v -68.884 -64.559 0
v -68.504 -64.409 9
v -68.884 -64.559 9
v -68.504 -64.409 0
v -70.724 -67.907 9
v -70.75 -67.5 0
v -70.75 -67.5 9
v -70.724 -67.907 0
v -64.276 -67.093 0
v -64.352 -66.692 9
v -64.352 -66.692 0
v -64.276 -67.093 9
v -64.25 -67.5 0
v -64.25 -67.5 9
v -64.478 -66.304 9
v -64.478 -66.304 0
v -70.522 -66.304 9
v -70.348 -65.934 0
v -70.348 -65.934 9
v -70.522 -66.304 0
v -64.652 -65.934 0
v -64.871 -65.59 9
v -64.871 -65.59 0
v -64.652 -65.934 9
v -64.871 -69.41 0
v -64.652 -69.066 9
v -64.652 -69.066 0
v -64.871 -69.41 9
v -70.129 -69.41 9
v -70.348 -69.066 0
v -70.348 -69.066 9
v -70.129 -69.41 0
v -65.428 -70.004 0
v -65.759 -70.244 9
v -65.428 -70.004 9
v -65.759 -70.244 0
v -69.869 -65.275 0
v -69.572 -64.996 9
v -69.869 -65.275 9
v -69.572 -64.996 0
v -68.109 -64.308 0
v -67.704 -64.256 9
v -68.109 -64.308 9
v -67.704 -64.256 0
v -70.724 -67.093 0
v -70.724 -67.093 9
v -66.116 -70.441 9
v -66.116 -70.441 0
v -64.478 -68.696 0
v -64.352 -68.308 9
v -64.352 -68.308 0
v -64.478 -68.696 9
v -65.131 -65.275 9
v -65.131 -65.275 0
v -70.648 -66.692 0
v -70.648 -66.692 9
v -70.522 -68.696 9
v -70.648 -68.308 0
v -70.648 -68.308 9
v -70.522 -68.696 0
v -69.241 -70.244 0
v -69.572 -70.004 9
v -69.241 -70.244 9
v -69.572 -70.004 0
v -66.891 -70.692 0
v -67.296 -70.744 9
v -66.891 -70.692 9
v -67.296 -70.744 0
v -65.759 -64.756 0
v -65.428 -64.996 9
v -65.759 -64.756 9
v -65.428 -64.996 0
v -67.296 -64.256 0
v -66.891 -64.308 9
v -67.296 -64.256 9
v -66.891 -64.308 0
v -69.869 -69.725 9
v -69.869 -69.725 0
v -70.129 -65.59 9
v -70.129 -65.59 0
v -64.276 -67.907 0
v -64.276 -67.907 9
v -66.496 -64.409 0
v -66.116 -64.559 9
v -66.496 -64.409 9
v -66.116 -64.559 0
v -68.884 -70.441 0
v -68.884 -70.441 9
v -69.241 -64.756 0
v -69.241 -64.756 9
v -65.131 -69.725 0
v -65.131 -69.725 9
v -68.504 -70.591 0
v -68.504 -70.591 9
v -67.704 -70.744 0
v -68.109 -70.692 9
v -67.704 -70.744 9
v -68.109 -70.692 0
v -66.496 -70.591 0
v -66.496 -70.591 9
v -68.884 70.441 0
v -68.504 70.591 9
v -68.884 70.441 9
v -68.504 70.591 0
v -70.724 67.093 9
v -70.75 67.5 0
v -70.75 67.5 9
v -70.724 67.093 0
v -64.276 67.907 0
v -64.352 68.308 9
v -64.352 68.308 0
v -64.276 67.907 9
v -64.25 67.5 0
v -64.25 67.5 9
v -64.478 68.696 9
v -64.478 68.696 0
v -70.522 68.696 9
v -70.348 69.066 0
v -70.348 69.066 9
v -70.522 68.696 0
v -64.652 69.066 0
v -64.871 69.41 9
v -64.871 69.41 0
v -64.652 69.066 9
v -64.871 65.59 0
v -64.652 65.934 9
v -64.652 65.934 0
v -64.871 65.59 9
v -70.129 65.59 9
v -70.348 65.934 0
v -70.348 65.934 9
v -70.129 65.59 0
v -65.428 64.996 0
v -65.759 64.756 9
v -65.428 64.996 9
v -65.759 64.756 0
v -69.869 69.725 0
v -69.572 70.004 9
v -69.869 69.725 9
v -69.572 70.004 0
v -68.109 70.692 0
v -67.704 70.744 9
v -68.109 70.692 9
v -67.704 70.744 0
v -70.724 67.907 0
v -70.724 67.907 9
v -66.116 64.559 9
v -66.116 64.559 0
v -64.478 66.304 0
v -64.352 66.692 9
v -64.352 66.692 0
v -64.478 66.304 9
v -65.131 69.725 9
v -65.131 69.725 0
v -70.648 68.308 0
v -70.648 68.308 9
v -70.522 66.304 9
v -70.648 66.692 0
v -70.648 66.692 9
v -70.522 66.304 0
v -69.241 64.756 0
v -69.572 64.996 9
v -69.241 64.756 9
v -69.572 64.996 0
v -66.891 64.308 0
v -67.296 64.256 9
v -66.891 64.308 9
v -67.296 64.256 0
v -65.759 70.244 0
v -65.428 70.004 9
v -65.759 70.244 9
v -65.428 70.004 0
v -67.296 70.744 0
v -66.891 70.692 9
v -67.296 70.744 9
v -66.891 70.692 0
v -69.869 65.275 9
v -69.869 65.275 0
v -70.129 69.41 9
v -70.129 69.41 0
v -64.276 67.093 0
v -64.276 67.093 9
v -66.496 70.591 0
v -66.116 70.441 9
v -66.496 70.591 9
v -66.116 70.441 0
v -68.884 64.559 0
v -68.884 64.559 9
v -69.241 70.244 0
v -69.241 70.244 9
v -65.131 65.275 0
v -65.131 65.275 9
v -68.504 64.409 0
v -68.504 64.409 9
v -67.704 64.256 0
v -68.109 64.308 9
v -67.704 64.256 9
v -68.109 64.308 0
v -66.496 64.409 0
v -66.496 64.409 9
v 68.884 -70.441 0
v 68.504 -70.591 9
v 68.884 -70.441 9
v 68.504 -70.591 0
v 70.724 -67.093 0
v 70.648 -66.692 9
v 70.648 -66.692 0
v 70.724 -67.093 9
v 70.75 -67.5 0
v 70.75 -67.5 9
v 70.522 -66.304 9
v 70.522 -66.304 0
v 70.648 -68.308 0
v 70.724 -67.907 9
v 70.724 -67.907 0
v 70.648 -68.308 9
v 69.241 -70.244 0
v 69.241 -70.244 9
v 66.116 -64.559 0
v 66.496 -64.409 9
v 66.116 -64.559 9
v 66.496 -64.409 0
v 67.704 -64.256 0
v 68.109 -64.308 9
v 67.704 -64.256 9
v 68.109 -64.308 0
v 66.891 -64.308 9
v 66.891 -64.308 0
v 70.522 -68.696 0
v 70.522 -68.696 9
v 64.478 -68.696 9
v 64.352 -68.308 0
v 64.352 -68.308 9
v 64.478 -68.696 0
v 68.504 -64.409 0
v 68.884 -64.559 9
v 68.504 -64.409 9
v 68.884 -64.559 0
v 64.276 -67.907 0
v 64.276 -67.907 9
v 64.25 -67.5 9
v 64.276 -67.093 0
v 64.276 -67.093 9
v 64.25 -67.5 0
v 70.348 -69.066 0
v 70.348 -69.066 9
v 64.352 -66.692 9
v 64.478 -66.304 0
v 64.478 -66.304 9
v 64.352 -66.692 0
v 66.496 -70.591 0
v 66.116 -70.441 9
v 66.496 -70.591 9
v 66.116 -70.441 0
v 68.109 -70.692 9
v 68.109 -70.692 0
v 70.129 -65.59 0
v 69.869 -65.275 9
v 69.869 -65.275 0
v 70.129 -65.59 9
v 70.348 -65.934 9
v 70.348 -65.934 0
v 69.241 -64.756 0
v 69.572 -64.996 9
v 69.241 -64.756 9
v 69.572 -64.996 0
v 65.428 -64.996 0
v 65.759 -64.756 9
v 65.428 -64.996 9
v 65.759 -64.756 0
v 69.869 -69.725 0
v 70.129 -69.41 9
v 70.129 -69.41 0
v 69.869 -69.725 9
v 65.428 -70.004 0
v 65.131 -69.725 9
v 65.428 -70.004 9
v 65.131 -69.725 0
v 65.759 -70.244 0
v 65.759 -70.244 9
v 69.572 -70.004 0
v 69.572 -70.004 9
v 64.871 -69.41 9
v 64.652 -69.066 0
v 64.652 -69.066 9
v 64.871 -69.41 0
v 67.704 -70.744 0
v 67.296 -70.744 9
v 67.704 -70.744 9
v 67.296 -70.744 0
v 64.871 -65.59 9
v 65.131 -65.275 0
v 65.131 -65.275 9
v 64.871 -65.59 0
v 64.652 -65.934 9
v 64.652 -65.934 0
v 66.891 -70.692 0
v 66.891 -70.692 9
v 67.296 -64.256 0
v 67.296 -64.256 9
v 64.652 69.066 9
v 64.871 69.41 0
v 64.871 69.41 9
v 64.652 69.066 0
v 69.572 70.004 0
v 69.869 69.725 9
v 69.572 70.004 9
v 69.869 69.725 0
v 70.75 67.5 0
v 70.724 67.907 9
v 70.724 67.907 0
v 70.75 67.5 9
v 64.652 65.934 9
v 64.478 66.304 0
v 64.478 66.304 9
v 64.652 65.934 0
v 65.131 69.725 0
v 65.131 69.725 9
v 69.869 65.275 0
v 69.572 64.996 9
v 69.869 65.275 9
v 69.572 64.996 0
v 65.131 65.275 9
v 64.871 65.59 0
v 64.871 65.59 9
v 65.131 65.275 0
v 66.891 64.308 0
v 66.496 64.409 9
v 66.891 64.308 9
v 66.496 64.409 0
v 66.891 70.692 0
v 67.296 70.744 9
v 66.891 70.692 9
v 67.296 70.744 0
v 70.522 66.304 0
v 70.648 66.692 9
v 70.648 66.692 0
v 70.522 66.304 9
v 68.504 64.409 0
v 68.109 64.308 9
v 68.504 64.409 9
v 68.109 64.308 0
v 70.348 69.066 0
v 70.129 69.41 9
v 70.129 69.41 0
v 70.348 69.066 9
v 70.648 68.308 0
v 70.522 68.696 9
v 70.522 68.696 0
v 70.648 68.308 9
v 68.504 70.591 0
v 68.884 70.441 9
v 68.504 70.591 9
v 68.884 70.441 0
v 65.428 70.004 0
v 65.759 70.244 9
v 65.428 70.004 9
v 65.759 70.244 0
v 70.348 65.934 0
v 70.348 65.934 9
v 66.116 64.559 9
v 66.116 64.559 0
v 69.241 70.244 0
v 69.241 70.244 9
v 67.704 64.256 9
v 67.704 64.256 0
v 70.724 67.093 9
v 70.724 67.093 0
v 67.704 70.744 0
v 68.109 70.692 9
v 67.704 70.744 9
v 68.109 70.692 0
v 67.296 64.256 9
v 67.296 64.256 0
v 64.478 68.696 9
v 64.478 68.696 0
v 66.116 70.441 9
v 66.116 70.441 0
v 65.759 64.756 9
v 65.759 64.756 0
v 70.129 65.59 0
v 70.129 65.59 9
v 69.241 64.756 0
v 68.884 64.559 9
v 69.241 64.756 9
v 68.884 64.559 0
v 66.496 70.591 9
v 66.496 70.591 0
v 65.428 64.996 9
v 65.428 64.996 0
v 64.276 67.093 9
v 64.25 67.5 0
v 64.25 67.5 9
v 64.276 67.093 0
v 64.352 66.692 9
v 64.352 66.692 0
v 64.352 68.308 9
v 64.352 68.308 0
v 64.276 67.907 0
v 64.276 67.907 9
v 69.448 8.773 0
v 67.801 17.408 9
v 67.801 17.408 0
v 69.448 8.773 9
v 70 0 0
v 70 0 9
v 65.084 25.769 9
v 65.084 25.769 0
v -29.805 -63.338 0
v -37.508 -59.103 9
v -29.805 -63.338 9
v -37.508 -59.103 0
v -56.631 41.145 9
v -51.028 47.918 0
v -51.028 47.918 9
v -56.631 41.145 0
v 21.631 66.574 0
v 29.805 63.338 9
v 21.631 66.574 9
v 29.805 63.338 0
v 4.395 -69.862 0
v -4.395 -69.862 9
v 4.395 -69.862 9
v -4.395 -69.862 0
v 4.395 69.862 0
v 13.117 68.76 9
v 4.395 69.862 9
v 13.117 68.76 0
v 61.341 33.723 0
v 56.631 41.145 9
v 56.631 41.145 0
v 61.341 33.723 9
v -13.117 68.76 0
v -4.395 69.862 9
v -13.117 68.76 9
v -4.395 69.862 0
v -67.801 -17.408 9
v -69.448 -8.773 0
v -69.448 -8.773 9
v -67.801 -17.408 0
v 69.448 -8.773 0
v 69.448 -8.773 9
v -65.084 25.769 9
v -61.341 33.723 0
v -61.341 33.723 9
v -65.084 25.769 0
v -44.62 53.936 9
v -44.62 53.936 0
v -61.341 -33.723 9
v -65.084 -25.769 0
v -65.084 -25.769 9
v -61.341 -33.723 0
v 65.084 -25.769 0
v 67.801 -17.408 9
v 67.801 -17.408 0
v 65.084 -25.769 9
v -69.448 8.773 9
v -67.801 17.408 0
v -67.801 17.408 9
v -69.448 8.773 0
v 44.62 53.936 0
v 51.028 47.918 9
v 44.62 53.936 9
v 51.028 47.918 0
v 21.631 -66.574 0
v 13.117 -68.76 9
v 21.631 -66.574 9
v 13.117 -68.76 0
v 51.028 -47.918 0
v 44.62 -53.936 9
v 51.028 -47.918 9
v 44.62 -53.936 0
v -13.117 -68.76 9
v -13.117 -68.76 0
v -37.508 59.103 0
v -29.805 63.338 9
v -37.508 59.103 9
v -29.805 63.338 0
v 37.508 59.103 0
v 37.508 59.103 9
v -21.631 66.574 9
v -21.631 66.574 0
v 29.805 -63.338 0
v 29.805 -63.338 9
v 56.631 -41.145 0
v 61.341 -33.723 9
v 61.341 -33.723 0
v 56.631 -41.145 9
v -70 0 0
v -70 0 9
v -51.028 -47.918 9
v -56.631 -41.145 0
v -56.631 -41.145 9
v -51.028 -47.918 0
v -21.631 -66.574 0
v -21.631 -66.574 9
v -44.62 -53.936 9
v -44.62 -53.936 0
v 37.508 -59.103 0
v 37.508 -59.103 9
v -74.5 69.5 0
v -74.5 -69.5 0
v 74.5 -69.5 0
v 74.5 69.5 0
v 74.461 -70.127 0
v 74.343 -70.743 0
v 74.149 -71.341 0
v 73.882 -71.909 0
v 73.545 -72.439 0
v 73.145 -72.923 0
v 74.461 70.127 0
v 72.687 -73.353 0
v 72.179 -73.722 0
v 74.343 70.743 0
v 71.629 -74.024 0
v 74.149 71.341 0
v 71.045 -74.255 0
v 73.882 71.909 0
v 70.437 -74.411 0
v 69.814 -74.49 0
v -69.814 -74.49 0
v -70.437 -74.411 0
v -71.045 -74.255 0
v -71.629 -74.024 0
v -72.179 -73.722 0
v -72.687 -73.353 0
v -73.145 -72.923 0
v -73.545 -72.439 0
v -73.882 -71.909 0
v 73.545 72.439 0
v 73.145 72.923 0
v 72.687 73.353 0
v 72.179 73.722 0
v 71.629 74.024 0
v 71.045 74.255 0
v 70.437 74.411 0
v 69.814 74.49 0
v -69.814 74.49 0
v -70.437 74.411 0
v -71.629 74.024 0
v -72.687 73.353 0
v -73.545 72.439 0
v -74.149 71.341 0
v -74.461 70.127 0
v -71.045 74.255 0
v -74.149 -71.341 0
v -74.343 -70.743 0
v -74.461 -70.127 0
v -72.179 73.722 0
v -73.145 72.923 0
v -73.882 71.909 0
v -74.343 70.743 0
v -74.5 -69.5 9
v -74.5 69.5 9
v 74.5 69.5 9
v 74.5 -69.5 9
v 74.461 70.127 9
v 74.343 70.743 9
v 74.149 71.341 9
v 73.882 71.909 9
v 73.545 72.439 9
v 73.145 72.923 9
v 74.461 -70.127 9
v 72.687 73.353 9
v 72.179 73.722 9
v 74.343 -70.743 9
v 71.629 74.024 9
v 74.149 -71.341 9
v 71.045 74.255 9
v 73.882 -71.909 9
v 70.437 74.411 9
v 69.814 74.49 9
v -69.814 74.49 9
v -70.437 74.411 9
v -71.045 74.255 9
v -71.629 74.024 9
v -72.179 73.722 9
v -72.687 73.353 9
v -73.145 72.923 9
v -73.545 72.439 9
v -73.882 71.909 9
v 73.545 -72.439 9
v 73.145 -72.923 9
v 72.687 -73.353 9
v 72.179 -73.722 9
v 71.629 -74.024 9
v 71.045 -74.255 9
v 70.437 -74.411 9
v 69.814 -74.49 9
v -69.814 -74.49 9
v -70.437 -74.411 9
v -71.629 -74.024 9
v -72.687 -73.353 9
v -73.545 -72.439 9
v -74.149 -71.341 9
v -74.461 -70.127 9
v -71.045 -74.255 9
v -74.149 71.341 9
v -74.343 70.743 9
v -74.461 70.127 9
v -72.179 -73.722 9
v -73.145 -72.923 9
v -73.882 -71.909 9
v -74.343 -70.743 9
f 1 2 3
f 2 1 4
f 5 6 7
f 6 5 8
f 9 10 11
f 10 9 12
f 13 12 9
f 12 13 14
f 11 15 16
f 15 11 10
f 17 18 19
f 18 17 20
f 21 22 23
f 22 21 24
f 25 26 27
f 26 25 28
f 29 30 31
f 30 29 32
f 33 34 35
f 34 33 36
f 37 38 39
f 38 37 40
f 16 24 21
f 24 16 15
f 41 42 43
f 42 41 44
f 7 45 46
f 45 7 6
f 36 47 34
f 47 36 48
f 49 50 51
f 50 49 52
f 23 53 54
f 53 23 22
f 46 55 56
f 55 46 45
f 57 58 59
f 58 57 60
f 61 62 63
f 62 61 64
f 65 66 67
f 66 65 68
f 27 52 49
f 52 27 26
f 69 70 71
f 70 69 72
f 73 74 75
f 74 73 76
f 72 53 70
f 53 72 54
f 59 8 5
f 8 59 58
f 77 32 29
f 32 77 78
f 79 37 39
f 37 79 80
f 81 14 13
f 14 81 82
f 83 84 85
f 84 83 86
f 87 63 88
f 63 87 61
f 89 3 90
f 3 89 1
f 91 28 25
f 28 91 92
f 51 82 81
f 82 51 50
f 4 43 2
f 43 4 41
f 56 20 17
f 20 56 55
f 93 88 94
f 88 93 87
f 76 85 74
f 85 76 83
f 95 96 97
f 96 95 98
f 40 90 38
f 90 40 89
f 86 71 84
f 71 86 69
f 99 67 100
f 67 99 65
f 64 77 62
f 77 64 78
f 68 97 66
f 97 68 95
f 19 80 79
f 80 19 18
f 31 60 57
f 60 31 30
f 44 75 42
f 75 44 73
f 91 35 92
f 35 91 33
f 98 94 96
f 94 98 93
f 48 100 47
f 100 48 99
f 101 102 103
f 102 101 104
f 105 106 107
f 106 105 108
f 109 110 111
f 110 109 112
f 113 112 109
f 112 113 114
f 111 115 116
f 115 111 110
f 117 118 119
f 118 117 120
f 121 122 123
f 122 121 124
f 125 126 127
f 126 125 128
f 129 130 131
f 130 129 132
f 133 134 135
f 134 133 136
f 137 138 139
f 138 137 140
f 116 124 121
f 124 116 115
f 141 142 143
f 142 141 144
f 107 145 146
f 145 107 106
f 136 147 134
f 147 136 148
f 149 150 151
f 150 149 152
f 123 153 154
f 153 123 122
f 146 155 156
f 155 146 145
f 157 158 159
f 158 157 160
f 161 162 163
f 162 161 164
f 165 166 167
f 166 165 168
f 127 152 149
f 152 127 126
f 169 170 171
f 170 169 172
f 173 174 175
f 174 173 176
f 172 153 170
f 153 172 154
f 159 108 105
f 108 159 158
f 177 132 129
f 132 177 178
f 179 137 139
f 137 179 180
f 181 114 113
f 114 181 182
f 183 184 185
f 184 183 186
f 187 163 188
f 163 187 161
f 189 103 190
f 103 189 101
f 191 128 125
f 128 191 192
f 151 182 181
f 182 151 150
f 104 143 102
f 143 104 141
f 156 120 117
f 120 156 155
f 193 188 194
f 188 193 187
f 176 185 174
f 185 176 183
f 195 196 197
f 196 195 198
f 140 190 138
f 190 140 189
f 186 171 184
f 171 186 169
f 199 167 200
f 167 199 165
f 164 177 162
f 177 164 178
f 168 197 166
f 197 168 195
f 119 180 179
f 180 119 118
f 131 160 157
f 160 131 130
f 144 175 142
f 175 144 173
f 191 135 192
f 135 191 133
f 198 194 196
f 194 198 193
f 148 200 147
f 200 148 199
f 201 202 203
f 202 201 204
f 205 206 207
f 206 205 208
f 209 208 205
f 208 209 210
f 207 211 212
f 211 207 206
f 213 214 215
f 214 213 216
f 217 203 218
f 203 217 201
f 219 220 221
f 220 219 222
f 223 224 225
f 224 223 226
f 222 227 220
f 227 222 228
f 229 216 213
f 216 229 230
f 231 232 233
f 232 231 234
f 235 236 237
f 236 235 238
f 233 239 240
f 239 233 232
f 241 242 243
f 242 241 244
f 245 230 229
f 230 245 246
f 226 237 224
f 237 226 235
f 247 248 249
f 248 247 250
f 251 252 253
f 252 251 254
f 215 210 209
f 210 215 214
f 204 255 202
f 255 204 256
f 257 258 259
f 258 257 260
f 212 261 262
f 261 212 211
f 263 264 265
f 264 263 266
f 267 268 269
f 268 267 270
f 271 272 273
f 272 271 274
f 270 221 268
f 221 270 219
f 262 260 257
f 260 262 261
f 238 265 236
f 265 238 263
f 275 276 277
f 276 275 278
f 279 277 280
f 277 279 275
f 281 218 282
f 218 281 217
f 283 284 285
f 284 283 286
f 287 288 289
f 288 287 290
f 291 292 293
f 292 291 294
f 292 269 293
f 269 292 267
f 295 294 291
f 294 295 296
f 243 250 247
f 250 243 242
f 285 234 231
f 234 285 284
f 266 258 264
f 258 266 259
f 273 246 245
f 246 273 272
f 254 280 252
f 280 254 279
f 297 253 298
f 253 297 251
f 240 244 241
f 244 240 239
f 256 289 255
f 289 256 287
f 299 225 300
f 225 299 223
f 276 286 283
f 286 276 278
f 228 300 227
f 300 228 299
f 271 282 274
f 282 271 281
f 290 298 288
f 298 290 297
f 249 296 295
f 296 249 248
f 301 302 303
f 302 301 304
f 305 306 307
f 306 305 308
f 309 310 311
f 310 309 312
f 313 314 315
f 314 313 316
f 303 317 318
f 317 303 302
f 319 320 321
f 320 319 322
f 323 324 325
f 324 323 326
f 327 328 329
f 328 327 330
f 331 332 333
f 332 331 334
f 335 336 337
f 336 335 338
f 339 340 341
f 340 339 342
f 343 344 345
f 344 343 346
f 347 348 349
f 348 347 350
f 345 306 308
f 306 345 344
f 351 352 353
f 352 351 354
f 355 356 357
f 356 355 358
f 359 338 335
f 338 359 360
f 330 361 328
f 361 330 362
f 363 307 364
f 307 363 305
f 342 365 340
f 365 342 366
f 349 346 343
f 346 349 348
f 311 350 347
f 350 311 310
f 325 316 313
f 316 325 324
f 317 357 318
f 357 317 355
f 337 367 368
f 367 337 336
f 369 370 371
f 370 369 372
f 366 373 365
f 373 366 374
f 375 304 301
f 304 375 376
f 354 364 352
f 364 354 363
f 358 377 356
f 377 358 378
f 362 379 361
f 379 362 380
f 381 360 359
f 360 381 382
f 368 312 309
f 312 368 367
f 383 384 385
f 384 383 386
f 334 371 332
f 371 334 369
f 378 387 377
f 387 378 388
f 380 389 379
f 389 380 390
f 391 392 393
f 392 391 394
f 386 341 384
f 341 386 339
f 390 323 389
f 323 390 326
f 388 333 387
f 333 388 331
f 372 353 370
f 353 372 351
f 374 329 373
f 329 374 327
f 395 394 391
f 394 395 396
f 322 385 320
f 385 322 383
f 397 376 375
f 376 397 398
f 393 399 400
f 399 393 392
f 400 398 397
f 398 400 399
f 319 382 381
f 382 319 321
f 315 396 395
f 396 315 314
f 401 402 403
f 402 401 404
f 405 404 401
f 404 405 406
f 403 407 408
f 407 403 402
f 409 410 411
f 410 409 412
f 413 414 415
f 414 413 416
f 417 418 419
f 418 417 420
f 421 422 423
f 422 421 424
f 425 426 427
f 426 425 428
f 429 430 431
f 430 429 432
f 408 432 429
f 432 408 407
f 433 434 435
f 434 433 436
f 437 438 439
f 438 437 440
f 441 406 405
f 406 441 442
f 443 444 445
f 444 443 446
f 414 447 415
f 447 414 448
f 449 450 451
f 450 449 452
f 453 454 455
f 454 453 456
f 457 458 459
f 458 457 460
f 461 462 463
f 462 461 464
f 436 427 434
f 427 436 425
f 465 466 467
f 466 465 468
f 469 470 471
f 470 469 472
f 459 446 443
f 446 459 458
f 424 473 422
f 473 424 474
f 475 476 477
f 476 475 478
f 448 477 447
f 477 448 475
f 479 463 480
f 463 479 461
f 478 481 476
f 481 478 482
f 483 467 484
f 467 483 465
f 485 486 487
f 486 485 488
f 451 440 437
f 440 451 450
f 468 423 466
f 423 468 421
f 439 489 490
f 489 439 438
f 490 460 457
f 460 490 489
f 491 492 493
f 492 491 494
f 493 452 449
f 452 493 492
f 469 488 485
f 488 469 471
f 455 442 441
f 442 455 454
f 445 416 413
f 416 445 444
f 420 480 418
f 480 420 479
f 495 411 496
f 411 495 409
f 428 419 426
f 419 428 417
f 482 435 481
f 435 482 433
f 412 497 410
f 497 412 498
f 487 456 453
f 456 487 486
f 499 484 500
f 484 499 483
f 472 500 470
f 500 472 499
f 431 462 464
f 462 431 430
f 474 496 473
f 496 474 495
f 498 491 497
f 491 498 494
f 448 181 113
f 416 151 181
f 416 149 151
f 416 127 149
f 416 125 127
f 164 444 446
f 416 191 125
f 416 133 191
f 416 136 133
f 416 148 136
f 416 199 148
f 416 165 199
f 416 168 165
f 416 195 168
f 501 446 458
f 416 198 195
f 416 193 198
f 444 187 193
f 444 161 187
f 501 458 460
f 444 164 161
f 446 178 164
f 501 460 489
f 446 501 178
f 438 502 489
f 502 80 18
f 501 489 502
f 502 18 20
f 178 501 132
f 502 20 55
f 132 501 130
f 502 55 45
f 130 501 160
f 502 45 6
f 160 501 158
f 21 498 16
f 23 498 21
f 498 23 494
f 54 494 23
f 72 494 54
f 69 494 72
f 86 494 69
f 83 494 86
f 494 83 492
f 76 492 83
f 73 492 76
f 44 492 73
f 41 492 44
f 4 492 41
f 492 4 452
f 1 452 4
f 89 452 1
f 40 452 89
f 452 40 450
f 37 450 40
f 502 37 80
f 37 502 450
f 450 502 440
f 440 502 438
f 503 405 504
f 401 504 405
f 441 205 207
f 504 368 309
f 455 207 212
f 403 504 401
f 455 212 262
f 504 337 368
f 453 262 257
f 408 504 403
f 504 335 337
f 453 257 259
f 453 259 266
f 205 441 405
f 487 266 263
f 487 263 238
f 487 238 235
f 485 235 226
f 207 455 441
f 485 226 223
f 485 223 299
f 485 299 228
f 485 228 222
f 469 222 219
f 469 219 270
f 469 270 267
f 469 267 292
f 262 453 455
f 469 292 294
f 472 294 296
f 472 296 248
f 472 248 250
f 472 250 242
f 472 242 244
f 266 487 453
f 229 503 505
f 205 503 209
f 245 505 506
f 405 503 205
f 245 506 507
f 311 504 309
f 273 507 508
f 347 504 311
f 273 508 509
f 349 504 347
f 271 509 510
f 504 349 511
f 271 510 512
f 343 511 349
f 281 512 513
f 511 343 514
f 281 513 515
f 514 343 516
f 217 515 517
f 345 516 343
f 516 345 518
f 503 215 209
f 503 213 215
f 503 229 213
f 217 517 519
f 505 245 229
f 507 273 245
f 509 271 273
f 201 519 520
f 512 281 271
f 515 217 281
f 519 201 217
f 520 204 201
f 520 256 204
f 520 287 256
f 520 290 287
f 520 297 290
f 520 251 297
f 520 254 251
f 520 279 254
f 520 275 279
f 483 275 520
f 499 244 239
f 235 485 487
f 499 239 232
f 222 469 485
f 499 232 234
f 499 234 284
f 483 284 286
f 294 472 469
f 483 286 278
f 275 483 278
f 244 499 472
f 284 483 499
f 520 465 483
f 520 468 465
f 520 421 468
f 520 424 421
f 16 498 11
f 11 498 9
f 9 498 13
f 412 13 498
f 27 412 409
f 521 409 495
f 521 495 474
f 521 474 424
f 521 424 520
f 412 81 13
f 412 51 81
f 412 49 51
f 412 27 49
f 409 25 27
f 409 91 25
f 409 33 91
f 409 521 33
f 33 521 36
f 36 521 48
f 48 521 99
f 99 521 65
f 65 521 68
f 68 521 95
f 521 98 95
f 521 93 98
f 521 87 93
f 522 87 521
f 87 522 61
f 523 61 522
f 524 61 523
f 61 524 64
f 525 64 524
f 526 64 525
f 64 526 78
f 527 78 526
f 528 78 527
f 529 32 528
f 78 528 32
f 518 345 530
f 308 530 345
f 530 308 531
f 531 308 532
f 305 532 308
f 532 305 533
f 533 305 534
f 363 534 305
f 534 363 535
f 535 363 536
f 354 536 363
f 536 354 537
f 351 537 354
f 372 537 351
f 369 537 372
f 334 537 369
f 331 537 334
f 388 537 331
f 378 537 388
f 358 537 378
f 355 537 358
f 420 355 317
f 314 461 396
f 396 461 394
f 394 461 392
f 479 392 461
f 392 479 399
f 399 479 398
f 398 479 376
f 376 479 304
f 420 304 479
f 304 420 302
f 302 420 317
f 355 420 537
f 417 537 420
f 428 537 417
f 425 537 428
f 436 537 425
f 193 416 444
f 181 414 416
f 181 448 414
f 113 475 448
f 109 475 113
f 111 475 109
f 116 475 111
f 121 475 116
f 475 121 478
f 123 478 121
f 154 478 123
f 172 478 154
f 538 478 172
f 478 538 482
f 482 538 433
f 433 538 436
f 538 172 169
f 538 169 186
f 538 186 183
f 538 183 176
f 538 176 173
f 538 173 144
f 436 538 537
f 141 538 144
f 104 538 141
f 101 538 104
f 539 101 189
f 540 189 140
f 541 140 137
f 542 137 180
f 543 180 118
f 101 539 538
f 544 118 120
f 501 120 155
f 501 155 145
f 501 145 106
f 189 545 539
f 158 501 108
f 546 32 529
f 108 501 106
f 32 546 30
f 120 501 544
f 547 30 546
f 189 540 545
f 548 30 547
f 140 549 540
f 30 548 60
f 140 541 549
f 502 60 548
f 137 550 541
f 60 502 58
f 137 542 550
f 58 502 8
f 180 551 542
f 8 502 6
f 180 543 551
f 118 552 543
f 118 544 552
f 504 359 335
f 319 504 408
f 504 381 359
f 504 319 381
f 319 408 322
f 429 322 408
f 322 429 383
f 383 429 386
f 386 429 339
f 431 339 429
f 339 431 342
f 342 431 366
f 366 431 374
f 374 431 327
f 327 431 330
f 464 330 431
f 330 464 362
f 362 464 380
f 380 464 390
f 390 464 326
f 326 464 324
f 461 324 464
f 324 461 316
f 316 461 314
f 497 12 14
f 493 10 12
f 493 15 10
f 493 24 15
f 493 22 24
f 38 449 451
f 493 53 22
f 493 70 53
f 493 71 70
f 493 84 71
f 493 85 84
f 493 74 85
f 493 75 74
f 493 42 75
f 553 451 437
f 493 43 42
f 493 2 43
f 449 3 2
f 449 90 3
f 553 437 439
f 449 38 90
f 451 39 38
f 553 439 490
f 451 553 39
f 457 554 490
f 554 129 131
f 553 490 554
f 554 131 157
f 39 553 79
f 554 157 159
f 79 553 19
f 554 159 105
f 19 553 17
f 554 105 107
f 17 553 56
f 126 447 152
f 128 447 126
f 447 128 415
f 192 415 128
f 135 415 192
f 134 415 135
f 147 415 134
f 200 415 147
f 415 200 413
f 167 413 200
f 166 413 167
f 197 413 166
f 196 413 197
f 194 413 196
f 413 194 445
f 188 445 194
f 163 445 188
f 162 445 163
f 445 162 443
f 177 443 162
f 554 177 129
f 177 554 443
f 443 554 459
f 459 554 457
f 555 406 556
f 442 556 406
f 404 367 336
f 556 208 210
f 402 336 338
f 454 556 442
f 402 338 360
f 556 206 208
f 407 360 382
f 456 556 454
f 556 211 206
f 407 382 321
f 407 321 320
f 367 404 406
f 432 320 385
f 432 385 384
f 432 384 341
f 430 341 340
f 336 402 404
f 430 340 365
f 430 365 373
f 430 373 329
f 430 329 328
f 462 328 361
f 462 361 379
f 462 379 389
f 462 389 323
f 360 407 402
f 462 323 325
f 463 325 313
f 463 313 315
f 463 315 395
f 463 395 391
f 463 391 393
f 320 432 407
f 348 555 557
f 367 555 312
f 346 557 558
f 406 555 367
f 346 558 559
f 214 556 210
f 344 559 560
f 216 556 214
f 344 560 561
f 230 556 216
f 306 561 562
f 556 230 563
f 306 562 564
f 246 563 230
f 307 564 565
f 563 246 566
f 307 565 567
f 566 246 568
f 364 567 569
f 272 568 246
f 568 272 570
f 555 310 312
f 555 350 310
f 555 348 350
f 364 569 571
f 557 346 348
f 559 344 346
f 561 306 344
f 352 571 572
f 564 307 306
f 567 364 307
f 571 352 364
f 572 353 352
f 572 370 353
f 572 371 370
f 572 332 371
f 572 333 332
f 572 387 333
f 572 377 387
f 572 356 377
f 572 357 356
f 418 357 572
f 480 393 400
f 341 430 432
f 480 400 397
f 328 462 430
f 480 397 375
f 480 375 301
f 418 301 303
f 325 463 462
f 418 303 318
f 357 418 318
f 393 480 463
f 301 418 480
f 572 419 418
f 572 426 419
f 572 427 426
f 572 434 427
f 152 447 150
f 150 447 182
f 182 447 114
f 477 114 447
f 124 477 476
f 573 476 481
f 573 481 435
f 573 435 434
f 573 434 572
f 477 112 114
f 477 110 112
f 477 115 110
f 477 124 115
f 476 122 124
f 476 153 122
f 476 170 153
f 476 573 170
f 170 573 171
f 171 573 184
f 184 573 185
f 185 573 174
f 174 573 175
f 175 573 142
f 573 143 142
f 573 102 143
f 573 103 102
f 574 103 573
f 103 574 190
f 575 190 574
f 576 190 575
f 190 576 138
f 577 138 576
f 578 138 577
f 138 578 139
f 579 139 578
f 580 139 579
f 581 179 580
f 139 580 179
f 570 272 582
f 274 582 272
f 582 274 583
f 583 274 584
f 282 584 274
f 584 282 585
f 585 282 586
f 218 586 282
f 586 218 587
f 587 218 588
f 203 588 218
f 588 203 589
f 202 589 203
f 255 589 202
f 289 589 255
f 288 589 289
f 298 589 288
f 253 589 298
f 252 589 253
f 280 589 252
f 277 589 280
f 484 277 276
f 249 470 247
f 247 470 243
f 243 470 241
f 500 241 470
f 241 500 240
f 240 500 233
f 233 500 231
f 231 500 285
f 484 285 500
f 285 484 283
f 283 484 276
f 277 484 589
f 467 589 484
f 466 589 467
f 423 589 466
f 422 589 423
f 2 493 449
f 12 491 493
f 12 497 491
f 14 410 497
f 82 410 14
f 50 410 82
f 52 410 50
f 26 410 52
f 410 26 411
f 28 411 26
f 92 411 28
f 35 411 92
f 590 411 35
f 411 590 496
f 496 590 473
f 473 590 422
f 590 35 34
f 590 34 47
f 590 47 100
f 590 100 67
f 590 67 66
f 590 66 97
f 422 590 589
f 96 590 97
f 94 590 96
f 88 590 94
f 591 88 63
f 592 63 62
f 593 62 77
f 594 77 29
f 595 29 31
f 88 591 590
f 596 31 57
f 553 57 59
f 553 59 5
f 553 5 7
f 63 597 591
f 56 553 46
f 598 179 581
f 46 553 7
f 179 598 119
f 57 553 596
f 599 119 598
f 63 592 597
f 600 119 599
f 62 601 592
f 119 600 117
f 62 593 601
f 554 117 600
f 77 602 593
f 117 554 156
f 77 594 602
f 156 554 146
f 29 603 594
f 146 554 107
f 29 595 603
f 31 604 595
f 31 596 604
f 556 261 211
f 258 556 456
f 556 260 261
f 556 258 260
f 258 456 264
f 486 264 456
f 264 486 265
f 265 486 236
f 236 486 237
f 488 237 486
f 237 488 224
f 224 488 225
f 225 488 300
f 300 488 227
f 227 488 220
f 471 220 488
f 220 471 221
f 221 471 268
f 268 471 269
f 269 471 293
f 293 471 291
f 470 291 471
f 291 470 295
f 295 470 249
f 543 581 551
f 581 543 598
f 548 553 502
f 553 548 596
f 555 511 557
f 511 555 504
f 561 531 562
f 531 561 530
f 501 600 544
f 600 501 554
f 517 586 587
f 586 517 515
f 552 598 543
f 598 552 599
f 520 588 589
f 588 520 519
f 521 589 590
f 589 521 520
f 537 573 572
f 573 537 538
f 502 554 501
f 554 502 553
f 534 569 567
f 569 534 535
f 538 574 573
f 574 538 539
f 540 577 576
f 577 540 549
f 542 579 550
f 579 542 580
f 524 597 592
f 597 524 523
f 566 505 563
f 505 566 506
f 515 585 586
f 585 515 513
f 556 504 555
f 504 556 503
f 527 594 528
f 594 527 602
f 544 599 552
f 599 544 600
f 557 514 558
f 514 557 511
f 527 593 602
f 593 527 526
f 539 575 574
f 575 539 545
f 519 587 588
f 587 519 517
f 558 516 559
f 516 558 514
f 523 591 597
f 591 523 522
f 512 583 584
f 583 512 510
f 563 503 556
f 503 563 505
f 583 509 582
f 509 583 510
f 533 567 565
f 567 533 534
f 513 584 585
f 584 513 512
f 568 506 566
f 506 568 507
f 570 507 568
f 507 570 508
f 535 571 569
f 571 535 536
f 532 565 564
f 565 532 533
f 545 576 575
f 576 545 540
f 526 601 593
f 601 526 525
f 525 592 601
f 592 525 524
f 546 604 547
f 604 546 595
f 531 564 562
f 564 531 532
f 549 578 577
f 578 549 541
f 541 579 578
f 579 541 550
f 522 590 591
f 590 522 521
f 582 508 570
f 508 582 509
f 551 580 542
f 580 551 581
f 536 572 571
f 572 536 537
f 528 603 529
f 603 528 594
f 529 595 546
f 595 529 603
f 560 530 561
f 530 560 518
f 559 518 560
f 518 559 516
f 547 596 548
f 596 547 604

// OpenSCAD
$fn = 50;

difference() {
	union() {
		hull() {
			translate(v = [-69.5, 69.5, 0]) {
				cylinder(h = 9, r = 5);
			}
			translate(v = [69.5, 69.5, 0]) {
				cylinder(h = 9, r = 5);
			}
			translate(v = [-69.5, -69.5, 0]) {
				cylinder(h = 9, r = 5);
			}
			translate(v = [69.5, -69.5, 0]) {
				cylinder(h = 9, r = 5);
			}
		}
	}
	union() {
		translate(v = [-67.5, -67.5, -100.0]) {
			cylinder(h = 200, r = 3.25);
		}
		translate(v = [-67.5, 67.5, -100.0]) {
			cylinder(h = 200, r = 3.25);
		}
		translate(v = [67.5, -67.5, -100.0]) {
			cylinder(h = 200, r = 3.25);
		}
		translate(v = [67.5, 67.5, -100.0]) {
			cylinder(h = 200, r = 3.25);
		}
		translate(v = [-67.5, -67.5, -100.0]) {
			cylinder(h = 200, r = 1.8);
		}
		translate(v = [-67.5, 67.5, -100.0]) {
			cylinder(h = 200, r = 1.8);
		}
		translate(v = [67.5, -67.5, -100.0]) {
			cylinder(h = 200, r = 1.8);
		}
		translate(v = [67.5, 67.5, -100.0]) {
			cylinder(h = 200, r = 1.8);
		}
		cylinder(h = 9, r = 70.0);
	}
}
